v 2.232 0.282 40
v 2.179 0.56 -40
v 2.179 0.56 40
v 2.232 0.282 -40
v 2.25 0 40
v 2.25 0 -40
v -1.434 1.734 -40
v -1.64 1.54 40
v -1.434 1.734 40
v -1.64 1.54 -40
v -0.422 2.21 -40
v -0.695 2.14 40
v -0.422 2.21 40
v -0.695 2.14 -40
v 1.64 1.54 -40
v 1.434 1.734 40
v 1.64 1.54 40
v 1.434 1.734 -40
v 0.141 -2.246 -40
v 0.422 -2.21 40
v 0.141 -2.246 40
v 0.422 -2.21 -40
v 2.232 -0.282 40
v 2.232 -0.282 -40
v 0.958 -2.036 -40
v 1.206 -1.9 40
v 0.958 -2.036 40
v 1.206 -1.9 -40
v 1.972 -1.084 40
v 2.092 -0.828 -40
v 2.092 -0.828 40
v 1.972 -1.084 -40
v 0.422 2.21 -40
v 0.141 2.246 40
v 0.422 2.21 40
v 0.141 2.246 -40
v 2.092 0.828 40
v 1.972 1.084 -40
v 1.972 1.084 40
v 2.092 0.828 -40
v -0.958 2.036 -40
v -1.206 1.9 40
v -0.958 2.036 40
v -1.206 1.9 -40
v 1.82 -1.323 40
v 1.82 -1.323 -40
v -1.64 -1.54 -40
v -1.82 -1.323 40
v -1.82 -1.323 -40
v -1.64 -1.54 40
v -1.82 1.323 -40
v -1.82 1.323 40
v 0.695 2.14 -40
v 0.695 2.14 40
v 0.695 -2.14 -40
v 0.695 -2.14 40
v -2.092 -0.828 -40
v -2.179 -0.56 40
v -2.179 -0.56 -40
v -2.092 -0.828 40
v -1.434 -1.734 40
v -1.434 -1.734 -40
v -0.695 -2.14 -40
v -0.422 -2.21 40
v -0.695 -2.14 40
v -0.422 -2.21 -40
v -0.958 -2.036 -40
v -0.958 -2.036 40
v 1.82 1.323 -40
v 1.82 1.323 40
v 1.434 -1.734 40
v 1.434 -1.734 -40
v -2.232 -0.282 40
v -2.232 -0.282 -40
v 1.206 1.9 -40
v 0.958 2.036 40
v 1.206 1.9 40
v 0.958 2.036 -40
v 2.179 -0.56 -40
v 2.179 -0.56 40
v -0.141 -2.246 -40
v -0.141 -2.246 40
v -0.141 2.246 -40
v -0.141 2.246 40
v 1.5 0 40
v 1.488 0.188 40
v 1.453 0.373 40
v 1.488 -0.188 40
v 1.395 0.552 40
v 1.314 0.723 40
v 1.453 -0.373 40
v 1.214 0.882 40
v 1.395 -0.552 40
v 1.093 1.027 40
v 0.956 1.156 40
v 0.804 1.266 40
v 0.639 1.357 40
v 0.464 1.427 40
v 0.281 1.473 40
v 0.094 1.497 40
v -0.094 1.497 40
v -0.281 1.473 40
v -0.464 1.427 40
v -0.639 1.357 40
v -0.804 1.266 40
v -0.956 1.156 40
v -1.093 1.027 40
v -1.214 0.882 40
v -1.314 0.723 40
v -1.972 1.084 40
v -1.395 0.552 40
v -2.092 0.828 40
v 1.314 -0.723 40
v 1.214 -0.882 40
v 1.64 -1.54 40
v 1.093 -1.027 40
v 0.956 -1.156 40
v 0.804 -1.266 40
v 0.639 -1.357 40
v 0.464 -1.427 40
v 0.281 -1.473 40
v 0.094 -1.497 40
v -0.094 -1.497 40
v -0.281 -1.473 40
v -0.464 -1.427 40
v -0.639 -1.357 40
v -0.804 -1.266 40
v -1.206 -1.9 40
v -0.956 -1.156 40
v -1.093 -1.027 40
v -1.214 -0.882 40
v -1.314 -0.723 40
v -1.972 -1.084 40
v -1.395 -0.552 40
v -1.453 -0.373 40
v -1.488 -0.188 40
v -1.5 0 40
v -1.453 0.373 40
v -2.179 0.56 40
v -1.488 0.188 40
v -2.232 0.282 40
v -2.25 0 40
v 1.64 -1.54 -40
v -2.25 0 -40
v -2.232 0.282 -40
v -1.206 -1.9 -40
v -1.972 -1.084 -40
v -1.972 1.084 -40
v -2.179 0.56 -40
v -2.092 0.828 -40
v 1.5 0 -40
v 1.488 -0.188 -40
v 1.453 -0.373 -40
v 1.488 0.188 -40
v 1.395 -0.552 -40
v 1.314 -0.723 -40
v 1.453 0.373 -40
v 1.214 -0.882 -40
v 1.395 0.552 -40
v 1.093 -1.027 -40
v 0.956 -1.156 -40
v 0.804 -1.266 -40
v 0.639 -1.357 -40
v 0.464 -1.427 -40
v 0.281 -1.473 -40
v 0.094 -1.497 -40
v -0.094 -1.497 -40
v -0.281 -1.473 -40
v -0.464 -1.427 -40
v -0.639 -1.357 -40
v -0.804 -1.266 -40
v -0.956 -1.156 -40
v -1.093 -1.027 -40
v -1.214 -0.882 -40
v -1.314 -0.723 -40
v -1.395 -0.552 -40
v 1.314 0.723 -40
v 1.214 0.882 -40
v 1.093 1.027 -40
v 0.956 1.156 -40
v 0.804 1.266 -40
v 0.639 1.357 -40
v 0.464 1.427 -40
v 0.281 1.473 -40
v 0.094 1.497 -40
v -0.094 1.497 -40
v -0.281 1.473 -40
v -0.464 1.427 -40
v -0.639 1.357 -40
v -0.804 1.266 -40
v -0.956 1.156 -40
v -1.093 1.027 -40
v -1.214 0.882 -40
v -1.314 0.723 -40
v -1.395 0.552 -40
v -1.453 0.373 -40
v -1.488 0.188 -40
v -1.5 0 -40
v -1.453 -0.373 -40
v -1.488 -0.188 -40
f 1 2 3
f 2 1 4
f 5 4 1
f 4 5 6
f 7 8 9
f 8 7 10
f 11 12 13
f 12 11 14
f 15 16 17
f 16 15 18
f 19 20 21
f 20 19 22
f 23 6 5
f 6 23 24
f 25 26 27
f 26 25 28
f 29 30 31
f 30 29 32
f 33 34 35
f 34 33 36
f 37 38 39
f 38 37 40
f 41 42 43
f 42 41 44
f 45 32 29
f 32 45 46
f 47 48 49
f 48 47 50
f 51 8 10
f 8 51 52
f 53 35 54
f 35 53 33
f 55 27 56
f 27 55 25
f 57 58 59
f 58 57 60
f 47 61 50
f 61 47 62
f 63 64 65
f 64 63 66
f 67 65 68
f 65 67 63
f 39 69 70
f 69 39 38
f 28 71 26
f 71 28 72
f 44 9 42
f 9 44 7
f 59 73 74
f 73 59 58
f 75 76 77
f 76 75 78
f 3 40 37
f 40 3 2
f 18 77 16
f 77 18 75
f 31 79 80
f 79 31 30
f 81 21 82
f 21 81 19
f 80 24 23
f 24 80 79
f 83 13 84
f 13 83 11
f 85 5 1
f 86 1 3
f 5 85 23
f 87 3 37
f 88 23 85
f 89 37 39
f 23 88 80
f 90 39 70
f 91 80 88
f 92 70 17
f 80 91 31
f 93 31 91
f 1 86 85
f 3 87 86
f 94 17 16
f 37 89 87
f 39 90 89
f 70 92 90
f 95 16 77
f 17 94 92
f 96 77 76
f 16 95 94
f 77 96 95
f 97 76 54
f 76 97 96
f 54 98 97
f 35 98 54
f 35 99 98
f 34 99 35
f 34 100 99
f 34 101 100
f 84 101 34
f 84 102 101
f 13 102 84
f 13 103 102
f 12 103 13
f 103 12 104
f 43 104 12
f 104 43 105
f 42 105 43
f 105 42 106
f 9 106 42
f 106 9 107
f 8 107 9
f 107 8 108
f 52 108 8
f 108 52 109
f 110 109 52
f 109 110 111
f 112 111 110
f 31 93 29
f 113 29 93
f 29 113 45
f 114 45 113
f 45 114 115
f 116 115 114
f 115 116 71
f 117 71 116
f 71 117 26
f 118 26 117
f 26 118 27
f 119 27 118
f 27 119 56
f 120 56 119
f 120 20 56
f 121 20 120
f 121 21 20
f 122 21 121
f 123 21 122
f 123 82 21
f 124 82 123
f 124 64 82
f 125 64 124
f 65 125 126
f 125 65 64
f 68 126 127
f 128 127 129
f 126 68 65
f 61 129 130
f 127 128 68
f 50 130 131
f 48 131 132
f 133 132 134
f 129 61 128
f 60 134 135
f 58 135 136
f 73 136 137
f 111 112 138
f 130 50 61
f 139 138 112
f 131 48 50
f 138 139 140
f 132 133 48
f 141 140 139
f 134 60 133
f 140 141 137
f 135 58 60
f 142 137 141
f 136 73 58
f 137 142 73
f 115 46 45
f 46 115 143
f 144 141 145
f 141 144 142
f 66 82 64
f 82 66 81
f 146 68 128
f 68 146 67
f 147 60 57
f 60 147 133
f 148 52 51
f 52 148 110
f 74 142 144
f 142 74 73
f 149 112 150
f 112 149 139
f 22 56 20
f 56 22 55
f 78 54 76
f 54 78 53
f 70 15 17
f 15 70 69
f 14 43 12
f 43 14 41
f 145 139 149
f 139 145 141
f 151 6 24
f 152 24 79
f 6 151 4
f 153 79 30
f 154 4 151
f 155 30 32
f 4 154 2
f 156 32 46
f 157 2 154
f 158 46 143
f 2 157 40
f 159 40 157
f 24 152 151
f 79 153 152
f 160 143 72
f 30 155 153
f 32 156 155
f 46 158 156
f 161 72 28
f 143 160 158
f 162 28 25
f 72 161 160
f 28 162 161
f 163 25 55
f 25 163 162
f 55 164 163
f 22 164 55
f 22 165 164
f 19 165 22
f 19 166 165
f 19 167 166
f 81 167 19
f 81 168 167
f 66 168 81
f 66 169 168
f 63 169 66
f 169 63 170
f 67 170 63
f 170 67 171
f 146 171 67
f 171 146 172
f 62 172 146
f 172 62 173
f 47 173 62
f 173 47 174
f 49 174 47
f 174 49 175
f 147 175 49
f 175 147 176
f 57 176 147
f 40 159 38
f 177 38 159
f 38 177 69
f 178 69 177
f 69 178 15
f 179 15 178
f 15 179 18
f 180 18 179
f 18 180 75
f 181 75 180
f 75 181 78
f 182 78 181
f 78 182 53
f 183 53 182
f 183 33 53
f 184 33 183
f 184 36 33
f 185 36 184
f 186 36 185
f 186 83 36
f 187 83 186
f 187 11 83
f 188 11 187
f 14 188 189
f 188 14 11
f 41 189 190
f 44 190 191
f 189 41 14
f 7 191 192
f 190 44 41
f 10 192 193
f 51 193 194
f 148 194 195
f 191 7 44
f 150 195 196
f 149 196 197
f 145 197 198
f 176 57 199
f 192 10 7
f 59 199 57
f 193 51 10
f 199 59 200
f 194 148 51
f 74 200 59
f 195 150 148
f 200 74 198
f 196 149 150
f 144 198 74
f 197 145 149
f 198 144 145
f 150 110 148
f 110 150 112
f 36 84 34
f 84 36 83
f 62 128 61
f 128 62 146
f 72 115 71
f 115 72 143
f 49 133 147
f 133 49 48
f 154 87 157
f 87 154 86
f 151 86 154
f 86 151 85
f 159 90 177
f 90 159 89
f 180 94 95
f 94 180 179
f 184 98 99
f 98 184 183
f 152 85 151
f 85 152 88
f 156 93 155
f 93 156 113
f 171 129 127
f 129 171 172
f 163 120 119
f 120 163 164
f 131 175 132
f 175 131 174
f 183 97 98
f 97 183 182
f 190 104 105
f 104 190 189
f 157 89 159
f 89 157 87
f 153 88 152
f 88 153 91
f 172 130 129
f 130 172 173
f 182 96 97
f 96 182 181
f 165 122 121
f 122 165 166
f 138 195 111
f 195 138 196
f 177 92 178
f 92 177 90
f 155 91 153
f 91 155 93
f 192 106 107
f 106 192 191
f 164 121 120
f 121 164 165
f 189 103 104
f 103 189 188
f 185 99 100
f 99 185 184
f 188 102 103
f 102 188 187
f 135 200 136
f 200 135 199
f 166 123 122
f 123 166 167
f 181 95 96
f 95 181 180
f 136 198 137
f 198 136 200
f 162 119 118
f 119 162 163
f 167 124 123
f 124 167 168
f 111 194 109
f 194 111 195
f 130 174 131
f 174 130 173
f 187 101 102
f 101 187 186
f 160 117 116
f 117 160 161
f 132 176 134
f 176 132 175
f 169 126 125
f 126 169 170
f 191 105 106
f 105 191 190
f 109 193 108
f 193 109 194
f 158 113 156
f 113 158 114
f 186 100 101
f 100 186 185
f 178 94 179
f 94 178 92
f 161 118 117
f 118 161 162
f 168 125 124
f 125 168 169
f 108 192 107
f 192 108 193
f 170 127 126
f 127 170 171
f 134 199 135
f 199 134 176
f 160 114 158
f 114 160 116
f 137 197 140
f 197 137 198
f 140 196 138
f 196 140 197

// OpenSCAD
$fn = 50;


difference() {
	union() {
		translate(v = [0, 0, -40.0000000000]) {
			cylinder(h = 80, r = 2.2500000000);
		}
	}
	union() {
		translate(v = [0, 0, -100.0000000000]) {
			cylinder(h = 200, r = 1.5000000000);
		}
	}
}
